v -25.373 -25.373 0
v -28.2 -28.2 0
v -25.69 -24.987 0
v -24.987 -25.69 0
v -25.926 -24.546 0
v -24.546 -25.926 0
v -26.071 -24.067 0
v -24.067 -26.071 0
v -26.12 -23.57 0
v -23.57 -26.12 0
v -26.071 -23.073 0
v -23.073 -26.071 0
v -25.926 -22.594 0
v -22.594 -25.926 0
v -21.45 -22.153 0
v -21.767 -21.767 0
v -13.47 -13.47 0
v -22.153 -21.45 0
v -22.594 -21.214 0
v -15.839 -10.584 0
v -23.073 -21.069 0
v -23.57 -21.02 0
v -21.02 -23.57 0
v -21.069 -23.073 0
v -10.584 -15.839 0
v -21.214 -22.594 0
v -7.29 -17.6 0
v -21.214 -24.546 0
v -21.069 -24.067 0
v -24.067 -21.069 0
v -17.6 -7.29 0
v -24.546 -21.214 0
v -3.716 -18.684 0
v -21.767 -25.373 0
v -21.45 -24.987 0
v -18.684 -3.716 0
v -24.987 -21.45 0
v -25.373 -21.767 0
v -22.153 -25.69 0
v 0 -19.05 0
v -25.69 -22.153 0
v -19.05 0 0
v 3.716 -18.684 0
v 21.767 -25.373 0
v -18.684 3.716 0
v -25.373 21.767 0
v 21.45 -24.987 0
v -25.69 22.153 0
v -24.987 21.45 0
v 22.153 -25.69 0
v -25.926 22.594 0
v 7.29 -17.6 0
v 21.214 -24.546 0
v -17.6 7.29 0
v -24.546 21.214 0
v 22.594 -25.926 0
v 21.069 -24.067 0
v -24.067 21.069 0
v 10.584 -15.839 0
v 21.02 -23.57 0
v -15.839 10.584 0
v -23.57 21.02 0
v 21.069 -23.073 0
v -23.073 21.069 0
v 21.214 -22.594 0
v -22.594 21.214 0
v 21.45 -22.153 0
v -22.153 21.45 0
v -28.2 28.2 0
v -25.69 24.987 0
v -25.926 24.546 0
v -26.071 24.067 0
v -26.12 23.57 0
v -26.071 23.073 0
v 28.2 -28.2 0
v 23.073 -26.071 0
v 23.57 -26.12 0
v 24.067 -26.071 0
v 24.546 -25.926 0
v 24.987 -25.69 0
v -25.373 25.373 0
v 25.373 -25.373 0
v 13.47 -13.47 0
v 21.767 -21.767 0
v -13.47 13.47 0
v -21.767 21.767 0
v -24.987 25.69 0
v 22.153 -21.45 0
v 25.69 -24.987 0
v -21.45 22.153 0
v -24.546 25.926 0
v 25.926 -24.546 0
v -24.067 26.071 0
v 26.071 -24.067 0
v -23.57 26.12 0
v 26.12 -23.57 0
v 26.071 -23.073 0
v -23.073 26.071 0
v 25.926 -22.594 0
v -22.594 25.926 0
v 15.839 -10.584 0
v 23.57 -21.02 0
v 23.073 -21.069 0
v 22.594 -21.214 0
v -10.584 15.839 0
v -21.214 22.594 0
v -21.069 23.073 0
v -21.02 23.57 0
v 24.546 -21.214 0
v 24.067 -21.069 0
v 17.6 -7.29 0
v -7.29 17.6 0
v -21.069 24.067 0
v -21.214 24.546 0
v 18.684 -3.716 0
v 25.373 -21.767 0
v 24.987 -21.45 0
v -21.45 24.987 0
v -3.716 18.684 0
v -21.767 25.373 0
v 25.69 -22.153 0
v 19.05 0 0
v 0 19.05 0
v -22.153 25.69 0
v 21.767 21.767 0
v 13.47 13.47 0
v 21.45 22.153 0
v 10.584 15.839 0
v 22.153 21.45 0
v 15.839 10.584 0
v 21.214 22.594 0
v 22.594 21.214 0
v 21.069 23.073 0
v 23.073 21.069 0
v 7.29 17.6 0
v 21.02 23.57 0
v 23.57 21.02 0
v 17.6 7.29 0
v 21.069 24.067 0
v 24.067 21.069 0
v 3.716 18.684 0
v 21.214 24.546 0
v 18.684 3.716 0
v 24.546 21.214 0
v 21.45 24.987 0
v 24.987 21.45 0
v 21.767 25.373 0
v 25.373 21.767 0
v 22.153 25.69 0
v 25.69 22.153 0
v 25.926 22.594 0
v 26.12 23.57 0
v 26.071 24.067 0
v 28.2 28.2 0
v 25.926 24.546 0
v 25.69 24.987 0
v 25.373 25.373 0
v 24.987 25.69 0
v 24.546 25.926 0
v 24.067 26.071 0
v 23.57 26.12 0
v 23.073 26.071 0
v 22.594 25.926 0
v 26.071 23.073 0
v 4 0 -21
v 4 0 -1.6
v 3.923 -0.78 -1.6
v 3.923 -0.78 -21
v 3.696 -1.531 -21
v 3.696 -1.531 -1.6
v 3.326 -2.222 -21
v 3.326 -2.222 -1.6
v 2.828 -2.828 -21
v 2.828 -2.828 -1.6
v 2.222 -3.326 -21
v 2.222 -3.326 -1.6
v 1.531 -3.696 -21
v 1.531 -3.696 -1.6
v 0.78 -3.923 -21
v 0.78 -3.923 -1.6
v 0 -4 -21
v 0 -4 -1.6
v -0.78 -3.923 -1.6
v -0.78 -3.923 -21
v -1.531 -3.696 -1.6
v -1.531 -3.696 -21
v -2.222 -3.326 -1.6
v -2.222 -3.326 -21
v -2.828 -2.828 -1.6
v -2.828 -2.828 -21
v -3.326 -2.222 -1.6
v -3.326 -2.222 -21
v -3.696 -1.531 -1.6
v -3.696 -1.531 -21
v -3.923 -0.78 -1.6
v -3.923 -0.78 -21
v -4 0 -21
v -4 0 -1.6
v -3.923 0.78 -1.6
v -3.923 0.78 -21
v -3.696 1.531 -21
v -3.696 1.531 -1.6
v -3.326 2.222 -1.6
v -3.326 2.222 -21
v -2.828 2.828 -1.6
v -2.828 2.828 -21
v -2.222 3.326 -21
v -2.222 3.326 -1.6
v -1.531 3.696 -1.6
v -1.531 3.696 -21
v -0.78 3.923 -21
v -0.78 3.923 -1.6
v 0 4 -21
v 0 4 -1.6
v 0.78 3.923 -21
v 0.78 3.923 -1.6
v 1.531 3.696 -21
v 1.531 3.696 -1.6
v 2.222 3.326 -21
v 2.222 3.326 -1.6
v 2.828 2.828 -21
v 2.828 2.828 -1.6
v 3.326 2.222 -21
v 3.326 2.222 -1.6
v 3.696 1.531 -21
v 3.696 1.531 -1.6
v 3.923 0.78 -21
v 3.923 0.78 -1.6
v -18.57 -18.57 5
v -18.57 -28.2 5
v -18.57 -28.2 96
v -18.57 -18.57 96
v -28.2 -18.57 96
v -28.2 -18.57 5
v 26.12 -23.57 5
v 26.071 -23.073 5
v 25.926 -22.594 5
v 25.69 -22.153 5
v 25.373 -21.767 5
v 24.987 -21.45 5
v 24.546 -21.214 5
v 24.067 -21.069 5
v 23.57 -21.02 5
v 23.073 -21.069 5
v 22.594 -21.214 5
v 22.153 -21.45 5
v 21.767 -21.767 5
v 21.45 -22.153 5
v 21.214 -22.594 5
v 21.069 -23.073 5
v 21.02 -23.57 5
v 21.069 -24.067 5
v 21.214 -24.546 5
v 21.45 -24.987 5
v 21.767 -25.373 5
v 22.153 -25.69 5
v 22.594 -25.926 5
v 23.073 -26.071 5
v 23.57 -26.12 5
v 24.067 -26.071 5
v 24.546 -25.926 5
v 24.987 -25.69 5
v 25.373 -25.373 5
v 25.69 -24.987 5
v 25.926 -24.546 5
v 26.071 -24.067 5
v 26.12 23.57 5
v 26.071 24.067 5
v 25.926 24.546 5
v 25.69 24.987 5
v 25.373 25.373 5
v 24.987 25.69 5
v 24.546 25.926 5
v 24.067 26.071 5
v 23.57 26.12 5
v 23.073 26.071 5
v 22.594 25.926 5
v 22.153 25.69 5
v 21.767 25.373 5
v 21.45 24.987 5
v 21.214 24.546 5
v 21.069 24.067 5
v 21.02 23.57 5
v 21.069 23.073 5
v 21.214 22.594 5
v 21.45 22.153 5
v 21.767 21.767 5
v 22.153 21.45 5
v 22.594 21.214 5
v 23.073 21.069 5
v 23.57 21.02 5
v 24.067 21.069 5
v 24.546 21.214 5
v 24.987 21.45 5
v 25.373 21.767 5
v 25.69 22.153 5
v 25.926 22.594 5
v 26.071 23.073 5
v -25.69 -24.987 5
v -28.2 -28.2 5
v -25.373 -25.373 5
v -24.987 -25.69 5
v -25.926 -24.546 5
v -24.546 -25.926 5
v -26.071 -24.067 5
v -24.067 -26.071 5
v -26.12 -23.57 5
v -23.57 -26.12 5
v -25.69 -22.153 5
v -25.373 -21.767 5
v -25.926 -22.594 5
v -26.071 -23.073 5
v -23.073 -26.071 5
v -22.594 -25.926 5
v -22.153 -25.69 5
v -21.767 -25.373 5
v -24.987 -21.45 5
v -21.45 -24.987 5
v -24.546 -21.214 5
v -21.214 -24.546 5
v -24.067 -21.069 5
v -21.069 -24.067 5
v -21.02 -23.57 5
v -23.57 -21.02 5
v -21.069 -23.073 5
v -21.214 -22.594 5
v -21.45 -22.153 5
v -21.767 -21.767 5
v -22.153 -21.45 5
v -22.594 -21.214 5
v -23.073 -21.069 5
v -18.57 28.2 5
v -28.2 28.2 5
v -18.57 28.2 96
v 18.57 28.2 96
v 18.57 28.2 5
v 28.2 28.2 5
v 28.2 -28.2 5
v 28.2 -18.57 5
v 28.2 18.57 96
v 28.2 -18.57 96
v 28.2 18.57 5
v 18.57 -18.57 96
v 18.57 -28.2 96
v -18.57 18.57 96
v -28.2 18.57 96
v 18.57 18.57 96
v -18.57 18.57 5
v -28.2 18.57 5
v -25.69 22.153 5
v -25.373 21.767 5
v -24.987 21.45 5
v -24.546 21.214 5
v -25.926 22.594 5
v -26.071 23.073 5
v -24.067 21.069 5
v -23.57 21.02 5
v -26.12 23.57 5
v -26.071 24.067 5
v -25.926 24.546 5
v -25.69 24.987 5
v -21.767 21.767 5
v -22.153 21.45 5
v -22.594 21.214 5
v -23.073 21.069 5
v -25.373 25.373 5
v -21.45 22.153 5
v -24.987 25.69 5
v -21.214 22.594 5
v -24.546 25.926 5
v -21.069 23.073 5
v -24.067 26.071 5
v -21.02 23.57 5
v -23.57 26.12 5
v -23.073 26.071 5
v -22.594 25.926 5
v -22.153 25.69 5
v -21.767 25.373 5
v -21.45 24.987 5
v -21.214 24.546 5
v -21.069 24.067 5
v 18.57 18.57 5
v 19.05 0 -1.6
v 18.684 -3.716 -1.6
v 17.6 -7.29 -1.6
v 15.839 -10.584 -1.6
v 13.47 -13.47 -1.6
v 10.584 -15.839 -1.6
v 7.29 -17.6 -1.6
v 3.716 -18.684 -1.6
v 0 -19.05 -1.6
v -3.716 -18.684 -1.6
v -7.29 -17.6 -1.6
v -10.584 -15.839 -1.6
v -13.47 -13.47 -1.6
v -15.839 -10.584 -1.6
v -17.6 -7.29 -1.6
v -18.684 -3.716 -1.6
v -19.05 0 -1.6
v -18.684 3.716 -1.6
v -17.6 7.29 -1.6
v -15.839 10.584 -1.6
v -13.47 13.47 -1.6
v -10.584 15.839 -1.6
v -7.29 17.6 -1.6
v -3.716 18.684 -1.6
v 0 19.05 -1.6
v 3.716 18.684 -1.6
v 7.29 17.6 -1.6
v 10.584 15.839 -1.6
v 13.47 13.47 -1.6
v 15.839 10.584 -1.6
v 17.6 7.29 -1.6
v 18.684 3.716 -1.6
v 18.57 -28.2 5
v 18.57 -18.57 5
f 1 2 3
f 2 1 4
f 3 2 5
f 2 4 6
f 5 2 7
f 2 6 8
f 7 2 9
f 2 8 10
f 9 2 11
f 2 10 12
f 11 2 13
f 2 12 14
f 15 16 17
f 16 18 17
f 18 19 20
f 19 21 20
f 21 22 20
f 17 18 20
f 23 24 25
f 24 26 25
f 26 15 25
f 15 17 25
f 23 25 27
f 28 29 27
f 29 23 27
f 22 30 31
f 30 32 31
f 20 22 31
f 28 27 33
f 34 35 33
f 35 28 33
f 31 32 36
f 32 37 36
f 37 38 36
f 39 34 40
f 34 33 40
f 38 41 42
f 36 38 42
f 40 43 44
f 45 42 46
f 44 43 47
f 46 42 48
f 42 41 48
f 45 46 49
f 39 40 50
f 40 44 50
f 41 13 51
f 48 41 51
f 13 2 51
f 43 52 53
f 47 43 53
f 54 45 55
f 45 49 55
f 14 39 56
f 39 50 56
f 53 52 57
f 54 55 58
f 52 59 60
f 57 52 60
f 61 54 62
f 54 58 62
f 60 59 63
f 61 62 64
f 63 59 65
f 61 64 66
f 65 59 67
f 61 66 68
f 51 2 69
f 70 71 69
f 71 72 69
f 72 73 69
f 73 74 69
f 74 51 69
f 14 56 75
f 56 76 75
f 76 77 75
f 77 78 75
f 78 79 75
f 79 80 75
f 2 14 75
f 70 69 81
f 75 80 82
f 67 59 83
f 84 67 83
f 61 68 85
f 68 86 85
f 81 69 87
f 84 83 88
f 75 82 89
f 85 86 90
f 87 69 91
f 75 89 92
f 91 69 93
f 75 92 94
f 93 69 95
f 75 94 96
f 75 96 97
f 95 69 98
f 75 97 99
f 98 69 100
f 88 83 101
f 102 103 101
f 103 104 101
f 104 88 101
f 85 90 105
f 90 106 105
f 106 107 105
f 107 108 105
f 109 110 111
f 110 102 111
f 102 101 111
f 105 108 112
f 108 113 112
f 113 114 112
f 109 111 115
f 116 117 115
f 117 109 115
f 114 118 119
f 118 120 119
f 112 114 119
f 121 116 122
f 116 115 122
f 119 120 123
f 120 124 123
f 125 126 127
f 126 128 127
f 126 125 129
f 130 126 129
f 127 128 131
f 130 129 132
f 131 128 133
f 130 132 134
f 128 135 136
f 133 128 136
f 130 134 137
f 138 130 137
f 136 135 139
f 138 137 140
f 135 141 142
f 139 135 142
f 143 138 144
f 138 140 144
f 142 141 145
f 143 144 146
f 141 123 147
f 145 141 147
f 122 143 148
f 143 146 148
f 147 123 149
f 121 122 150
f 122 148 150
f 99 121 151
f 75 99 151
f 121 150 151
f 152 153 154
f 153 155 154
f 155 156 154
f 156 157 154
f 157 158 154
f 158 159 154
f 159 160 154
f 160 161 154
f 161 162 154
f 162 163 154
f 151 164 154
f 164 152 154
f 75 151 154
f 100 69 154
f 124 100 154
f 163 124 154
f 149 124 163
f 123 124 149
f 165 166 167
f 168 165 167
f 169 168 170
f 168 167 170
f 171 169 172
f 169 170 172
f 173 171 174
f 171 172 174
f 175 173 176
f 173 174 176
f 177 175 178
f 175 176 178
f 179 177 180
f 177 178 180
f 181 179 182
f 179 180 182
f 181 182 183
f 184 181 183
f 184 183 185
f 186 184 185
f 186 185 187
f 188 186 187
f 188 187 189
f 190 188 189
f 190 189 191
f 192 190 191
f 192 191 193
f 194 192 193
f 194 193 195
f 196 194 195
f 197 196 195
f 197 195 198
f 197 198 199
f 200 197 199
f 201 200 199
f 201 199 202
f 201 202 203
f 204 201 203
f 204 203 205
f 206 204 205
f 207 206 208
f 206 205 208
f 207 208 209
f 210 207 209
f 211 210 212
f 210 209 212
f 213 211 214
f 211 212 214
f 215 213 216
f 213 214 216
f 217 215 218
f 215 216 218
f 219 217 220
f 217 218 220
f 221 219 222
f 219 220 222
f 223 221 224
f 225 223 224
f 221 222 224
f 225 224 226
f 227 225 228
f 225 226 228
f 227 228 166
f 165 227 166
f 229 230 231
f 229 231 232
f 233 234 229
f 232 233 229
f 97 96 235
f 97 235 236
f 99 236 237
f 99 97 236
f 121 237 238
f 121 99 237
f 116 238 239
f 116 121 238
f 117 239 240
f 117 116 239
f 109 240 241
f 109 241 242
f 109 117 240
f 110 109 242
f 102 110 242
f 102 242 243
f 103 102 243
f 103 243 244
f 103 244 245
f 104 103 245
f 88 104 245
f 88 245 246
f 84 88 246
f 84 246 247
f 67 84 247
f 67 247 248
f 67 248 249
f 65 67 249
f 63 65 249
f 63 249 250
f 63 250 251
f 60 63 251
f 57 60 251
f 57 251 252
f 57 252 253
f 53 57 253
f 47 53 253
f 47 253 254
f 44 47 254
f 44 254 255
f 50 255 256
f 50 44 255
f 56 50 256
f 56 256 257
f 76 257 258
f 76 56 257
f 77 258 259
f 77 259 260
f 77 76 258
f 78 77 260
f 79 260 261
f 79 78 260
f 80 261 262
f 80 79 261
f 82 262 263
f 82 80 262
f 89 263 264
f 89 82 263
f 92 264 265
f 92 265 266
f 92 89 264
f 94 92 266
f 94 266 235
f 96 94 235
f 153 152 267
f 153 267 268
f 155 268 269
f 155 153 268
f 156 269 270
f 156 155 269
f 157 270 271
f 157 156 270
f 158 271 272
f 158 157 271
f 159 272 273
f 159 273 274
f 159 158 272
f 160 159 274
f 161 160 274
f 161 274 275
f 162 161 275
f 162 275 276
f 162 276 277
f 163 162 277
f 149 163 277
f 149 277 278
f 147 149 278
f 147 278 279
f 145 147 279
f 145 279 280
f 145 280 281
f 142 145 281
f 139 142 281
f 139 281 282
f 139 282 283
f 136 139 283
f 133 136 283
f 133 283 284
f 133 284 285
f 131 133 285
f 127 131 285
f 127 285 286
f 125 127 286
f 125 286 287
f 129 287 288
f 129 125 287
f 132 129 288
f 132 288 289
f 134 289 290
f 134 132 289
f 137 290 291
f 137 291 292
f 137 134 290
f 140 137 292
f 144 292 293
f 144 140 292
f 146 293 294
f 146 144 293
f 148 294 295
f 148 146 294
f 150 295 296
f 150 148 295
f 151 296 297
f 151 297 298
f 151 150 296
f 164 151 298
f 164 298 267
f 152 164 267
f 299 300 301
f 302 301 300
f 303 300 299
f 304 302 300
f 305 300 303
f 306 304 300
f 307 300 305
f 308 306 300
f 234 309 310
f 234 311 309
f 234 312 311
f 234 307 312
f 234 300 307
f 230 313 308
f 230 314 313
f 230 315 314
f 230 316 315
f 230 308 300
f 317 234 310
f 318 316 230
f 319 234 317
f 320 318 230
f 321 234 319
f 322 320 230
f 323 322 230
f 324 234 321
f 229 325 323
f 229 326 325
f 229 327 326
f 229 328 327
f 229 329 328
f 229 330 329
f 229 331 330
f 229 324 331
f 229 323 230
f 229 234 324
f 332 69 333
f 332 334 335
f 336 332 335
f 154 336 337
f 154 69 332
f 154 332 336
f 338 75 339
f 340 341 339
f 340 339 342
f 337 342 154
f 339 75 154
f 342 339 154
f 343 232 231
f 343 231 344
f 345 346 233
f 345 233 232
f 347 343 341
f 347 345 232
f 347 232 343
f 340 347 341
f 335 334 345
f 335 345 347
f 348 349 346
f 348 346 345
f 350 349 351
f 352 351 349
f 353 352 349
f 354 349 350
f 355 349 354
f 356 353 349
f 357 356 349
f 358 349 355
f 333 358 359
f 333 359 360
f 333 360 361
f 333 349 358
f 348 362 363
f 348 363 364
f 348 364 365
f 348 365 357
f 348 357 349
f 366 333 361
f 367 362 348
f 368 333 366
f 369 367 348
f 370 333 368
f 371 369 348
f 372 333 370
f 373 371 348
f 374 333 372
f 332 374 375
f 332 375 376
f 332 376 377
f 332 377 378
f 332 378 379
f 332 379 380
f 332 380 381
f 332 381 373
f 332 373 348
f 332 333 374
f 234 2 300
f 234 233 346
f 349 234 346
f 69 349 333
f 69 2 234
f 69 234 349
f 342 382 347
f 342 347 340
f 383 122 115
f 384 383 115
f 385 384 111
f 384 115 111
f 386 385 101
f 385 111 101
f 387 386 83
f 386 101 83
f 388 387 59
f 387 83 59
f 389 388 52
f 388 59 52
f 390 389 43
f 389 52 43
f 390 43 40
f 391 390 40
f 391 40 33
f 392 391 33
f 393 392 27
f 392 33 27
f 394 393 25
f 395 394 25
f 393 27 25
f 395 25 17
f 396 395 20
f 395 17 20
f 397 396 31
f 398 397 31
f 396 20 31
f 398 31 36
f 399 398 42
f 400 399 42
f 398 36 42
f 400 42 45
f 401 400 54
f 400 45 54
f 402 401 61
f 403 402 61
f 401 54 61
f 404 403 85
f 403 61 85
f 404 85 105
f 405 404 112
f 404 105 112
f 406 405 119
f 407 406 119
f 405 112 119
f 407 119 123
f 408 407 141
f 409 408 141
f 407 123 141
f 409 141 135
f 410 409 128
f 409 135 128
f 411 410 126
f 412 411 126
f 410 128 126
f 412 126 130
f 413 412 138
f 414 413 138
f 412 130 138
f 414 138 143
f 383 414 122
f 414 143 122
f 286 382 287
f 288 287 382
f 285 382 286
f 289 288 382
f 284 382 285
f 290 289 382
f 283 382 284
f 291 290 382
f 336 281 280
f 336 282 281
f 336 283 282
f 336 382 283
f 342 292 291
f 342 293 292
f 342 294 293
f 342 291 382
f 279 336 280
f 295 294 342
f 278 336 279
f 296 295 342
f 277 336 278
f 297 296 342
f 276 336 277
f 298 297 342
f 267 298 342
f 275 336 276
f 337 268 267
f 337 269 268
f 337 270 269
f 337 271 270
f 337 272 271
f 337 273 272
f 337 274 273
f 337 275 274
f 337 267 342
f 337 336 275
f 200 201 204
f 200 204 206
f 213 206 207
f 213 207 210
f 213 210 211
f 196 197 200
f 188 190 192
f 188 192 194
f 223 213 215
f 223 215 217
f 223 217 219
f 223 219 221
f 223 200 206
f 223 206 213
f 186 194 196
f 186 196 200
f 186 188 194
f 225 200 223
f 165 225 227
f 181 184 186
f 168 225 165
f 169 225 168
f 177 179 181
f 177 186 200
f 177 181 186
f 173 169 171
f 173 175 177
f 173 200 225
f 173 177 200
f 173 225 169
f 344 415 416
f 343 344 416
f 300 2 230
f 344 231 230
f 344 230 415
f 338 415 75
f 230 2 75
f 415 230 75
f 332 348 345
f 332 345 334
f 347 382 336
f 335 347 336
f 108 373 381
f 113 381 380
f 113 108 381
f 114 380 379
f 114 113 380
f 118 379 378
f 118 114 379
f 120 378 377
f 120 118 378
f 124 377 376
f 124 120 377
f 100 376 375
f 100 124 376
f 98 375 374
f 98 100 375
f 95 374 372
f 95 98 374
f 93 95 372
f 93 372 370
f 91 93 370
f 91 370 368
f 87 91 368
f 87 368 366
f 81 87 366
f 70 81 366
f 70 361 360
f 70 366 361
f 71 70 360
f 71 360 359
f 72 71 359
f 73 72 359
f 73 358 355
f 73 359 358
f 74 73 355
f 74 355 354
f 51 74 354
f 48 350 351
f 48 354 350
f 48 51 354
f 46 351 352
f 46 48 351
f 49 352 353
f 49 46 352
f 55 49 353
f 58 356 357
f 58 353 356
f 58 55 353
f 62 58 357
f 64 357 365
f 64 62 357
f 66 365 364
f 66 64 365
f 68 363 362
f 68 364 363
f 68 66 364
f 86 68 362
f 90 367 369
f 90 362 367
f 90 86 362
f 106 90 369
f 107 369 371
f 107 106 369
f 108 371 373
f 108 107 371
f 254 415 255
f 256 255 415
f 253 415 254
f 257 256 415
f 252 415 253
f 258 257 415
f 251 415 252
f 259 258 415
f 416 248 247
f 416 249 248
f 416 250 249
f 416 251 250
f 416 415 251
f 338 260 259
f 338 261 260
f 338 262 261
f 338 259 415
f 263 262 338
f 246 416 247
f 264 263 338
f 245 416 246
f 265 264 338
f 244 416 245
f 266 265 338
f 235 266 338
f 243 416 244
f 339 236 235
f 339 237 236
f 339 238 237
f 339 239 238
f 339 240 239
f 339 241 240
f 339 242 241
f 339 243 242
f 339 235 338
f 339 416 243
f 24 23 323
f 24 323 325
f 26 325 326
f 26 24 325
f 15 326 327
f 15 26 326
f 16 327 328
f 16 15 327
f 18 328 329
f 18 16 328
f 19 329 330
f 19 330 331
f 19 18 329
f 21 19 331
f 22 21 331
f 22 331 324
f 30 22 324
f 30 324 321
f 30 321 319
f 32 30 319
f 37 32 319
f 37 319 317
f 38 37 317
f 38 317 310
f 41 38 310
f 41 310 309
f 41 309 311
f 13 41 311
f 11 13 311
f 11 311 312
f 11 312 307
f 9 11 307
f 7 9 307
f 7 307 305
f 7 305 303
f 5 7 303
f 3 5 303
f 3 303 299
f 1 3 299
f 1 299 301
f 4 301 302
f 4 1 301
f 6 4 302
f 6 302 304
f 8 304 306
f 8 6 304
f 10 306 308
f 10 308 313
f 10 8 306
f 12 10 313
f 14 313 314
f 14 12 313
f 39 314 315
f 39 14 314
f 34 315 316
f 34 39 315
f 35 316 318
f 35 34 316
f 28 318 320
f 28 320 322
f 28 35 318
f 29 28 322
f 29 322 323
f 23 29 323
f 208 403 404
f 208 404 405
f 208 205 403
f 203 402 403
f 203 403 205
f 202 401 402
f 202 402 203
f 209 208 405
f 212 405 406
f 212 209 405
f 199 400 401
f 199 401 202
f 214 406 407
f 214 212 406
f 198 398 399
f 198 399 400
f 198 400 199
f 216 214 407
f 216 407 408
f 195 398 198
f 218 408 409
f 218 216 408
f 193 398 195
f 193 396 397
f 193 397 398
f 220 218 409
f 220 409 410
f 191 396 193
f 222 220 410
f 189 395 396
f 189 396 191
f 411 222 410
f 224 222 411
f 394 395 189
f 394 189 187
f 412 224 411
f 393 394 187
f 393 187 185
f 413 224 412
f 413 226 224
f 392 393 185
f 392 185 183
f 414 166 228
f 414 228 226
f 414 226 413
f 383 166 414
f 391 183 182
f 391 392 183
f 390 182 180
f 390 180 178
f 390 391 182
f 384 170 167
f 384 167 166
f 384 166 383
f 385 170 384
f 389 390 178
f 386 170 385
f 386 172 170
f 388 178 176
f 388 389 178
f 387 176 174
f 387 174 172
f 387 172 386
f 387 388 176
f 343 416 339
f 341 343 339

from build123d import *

# Parameters (mm, degrees)
SKETCH_1_W          = 56.4
SKETCH_1_H          = 56.4
SKETCH_1_R          = 2.55
EXTRUDE_1_DEPTH     = 96
CUT_EXTRUDE_START   = -91
SKETCH_2_W          = 9.63
SKETCH_2_H          = 9.63
SKETCH_2_R          = 2.55
SKETCH_2_W_2        = 10
SKETCH_2_H_2        = 10
CUT_EXTRUDE_1_DEPTH = 91
SKETCH_3_R          = 4
EXTRUDE_2_DEPTH     = 21
SKETCH_4_R          = 19.05
EXTRUDE_3_DEPTH     = 1.6


with BuildPart() as part:
    # 草图1 → 凸台-拉伸1 (new body)
    with BuildSketch(Plane.XY):
        Rectangle(SKETCH_1_W, SKETCH_1_H)
        with Locations((23.57, 23.57)):
            Circle(SKETCH_1_R, mode=Mode.SUBTRACT)
        with Locations((23.57, -23.57)):
            Circle(SKETCH_1_R, mode=Mode.SUBTRACT)
        with Locations((-23.57, -23.57)):
            Circle(SKETCH_1_R, mode=Mode.SUBTRACT)
        with Locations((-23.57, 23.57)):
            Circle(SKETCH_1_R, mode=Mode.SUBTRACT)
    extrude(amount=EXTRUDE_1_DEPTH)

    # 草图2 → 切除-拉伸1 (cut)
    # profile 1 of 4: a face of its own
    with BuildSketch(Plane.XY.offset(96).offset(CUT_EXTRUDE_START)):
        with Locations((-23.385, -23.385)):
            Rectangle(SKETCH_2_W, SKETCH_2_H)
        with Locations((-23.57, -23.57)):
            Circle(SKETCH_2_R, mode=Mode.SUBTRACT)
    # profile 2 of 4: a face of its own
    with BuildSketch(Plane.XY.offset(96).offset(CUT_EXTRUDE_START)):
        with Locations((23.385, -23.385)):
            Rectangle(SKETCH_2_W, SKETCH_2_H)
        with Locations((23.57, -23.57)):
            Circle(SKETCH_2_R, mode=Mode.SUBTRACT)
    # profile 3 of 4: a face of its own
    with BuildSketch(Plane.XY.offset(96).offset(CUT_EXTRUDE_START)):
        with Locations((23.385, 23.385)):
            Rectangle(SKETCH_2_W, SKETCH_2_H)
        with Locations((23.57, 23.57)):
            Circle(SKETCH_2_R, mode=Mode.SUBTRACT)
    # profile 4 of 4: a face of its own
    with BuildSketch(Plane.XY.offset(96).offset(CUT_EXTRUDE_START)):
        with Locations((-23.57, 23.57)):
            Rectangle(SKETCH_2_W_2, SKETCH_2_H_2)
    extrude(amount=CUT_EXTRUDE_1_DEPTH, mode=Mode.SUBTRACT)

    # 草图3 → 凸台-拉伸2 (add)
    with BuildSketch(Plane(origin=(0, 0, 0), x_dir=(-1, 0, 0), z_dir=(0, 0, -1))):
        with Locations(Location((0, 0, 0), (0, 0, 180))):
            Circle(SKETCH_3_R)
    extrude(amount=EXTRUDE_2_DEPTH)

    # 草图4 → 凸台-拉伸3 (add)
    with BuildSketch(Plane(origin=(0, 0, 0), x_dir=(-1, 0, 0), z_dir=(0, 0, -1))):
        with Locations(Location((0, 0, 0), (0, 0, 180))):
            Circle(SKETCH_4_R)
    extrude(amount=EXTRUDE_3_DEPTH)


solid = part.part
